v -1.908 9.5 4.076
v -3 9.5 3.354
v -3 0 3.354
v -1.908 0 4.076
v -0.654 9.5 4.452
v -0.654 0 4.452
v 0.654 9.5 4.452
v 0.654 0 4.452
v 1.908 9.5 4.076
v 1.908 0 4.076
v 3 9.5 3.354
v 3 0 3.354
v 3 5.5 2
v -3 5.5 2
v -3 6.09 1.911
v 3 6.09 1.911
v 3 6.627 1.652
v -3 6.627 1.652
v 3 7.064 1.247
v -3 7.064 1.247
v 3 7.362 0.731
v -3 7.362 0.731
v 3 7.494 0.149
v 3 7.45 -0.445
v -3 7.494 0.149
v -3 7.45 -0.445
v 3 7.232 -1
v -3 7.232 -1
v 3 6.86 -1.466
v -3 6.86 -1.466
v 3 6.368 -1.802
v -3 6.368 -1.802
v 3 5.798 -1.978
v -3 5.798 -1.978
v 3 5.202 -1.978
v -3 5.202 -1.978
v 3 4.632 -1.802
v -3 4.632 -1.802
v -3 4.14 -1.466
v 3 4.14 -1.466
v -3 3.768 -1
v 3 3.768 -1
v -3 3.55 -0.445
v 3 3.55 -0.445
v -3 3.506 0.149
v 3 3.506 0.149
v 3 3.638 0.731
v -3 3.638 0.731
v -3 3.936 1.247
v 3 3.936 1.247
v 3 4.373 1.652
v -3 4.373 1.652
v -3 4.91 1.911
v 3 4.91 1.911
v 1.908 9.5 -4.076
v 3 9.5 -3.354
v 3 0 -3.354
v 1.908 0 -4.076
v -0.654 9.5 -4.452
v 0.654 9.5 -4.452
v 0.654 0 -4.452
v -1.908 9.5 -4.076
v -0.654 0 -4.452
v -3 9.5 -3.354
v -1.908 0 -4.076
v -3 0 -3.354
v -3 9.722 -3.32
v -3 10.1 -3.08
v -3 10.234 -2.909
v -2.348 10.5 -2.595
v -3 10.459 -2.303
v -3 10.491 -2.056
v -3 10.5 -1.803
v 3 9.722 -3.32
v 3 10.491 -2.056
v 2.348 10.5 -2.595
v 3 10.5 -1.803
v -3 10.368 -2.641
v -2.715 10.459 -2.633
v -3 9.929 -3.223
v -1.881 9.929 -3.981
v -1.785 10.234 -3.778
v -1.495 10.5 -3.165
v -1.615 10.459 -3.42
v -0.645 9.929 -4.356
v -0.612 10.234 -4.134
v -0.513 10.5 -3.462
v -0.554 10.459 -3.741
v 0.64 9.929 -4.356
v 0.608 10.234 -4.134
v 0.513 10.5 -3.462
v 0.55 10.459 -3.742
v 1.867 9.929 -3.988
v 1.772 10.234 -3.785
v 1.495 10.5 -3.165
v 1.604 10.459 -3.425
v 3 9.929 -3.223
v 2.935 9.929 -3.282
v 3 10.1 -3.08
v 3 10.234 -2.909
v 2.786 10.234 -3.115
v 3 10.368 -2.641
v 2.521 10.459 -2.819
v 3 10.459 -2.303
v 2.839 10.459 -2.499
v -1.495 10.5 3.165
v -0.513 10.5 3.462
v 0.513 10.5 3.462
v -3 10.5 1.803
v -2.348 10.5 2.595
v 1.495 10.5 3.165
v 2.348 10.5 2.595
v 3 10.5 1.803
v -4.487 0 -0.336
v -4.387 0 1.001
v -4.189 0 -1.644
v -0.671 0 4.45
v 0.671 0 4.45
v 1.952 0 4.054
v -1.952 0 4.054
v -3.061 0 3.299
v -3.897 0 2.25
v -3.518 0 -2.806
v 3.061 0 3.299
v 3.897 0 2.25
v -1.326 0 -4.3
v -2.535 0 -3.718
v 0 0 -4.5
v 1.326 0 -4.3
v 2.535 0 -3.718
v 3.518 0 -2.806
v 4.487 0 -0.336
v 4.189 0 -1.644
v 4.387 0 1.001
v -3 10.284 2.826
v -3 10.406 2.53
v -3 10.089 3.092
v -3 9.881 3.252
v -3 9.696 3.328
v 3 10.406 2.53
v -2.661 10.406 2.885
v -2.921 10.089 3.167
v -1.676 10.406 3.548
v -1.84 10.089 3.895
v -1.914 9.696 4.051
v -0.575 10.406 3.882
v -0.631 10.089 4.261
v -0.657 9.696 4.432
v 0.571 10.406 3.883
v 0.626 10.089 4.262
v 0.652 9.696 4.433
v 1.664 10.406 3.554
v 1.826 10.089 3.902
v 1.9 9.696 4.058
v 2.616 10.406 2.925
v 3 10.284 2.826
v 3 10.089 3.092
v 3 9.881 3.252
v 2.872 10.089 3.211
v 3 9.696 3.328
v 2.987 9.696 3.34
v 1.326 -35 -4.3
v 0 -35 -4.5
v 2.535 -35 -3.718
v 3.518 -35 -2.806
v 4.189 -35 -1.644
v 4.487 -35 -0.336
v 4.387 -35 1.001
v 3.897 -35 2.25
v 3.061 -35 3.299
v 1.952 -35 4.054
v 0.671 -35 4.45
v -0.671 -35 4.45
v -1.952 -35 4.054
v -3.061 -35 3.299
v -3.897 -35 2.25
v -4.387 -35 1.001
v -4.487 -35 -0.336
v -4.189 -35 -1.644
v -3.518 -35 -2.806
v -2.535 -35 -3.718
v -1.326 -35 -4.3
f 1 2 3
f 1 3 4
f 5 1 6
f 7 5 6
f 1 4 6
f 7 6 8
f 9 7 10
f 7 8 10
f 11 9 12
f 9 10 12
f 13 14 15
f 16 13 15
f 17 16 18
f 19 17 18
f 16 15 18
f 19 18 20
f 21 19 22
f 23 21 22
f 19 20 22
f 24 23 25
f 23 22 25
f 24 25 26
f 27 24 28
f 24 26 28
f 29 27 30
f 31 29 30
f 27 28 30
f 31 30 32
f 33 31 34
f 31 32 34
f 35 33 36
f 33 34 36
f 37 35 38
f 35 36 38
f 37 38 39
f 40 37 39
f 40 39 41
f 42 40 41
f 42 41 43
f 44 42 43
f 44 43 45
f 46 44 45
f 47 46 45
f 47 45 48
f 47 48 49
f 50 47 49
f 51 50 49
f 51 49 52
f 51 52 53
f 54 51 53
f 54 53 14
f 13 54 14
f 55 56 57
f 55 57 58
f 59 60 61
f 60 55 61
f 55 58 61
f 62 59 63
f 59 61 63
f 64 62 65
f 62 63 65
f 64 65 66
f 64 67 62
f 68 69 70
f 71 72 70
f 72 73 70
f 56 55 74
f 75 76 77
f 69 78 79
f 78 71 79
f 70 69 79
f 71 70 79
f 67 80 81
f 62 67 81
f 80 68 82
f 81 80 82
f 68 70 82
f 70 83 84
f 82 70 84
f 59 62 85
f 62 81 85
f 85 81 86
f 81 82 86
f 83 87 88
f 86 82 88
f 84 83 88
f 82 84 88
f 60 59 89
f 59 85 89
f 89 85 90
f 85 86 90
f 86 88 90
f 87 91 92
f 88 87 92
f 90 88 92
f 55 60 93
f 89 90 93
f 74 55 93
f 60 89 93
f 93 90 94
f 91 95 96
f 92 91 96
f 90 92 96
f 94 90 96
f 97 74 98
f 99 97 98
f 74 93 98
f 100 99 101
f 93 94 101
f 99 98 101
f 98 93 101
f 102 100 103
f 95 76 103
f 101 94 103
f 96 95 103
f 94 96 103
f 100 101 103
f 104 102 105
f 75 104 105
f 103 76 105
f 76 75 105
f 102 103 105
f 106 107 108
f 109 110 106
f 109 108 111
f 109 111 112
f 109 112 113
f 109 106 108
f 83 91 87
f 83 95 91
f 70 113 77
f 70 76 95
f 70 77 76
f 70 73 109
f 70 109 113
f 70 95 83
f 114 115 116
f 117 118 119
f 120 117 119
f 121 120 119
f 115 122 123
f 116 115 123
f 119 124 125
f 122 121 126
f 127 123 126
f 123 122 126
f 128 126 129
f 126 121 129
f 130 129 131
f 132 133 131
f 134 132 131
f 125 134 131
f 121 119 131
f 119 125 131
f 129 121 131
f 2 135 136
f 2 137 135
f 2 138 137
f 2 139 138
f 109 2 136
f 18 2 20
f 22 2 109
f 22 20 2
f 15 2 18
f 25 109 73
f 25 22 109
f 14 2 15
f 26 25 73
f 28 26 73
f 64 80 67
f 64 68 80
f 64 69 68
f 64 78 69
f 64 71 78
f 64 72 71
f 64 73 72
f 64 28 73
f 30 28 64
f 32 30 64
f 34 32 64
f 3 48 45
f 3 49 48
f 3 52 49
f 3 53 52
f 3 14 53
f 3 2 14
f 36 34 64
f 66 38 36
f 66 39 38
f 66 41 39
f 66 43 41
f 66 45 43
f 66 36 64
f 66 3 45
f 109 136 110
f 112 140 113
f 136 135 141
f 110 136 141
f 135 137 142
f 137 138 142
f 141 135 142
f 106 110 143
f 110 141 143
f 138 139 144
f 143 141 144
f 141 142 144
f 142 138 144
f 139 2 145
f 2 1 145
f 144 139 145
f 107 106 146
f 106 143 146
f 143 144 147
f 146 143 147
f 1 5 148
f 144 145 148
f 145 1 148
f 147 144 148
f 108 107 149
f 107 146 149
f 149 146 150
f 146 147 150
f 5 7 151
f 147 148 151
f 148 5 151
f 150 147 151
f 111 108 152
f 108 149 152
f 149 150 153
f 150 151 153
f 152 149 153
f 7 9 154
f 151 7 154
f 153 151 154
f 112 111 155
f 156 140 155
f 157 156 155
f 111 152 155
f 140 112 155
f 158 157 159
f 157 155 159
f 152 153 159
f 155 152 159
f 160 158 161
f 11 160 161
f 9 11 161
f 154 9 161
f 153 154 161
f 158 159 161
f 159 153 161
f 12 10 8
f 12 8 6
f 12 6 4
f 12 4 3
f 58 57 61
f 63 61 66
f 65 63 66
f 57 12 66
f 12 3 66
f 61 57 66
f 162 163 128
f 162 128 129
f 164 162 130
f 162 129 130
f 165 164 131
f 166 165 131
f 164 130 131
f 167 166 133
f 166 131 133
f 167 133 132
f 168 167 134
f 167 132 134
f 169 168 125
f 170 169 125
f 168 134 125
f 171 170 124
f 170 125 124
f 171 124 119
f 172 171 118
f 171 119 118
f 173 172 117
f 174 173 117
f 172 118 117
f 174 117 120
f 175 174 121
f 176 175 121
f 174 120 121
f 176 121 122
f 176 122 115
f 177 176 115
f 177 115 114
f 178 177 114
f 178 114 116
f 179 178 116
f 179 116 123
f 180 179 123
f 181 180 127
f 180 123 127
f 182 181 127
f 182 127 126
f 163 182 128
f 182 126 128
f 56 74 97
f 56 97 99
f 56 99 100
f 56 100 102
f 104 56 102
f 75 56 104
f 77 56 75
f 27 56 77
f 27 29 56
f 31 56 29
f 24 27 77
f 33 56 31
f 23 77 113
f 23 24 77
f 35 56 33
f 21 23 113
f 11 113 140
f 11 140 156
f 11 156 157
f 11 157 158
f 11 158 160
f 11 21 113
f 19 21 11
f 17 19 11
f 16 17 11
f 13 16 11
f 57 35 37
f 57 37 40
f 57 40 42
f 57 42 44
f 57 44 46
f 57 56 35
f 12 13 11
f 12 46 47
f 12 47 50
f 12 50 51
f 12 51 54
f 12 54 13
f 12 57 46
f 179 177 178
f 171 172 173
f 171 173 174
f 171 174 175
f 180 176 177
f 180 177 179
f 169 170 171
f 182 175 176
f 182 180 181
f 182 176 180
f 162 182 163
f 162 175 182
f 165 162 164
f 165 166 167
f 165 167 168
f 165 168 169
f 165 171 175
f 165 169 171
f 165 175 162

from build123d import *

# Parameters (mm, degrees)
SKETCH_1_R          = 4.5
EXTRUDE_1_DEPTH     = 10.5
CUT_EXTRUDE_START   = -10.5
CUT_EXTRUDE_1_DEPTH = 10.5
CUT_EXTRUDE_2_REACH = 14.903
SKETCH_3_R          = 2
SKETCH_4_R          = 4.5
EXTRUDE_2_DEPTH     = 35
FILLET_1_R          = 1


with BuildPart() as part:
    # 草图1 → 凸台-拉伸1 (new body)
    with BuildSketch(Plane(origin=(0, 0, 0), x_dir=(1, 0, 0), z_dir=(0, 1, 0))):
        with Locations(Location((0, 0, 0), (0, 0, 90))):
            Circle(SKETCH_1_R)
    extrude(amount=EXTRUDE_1_DEPTH)

    # 草图2 → 切除-拉伸1 (cut)
    with BuildSketch(Plane(origin=(0, 10.5, 0), x_dir=(1, 0, 0), z_dir=(0, 1, 0)).offset(CUT_EXTRUDE_START)):
        with BuildLine():
            Line((-3, -3.354101966), (-3, 3.354101966))
            ThreePointArc((-3, 3.354101966), (-4.5, 0), (-3, -3.354101966))
        make_face()
        with BuildLine():
            ThreePointArc((4.5, 0), (4.107919181, 1.837117307), (3, 3.354101966))
            Line((3, 3.354101966), (3, -3.354101966))
            ThreePointArc((3, -3.354101966), (4.107919181, -1.837117307), (4.5, 0))
        make_face()
    extrude(amount=CUT_EXTRUDE_1_DEPTH, mode=Mode.SUBTRACT)

    # 草图3 → 切除-拉伸2 (cut, up to next)
    with BuildSketch(Plane.ZY.offset(3), mode=Mode.PRIVATE) as cut_extrude_2_sk1:
        with Locations((0, 5.5)):
            Circle(SKETCH_3_R)
    cut_extrude_2_tool1 = extrude(cut_extrude_2_sk1.sketch, amount=-CUT_EXTRUDE_2_REACH, mode=Mode.PRIVATE) & part.part
    add(cut_extrude_2_tool1.solids().sort_by_distance((-3, 5.5, 0))[0], mode=Mode.SUBTRACT)

    # 圆角1
    fillet_1_edges = [part.edges().sort_by_distance(p)[0] for p in [
        (0, 10.5, -4.5),
        (0, 10.5, 4.5),
    ]]
    fillet(fillet_1_edges, radius=FILLET_1_R)


with BuildPart() as body_2:
    # 草图4 → 凸台-拉伸2 (new body)
    with BuildSketch(Plane.XZ):
        with Locations(Location((0, 0, 0), (0, 0, 270))):
            Circle(SKETCH_4_R)
    extrude(amount=EXTRUDE_2_DEPTH)


solid = Compound([part.part, body_2.part])
